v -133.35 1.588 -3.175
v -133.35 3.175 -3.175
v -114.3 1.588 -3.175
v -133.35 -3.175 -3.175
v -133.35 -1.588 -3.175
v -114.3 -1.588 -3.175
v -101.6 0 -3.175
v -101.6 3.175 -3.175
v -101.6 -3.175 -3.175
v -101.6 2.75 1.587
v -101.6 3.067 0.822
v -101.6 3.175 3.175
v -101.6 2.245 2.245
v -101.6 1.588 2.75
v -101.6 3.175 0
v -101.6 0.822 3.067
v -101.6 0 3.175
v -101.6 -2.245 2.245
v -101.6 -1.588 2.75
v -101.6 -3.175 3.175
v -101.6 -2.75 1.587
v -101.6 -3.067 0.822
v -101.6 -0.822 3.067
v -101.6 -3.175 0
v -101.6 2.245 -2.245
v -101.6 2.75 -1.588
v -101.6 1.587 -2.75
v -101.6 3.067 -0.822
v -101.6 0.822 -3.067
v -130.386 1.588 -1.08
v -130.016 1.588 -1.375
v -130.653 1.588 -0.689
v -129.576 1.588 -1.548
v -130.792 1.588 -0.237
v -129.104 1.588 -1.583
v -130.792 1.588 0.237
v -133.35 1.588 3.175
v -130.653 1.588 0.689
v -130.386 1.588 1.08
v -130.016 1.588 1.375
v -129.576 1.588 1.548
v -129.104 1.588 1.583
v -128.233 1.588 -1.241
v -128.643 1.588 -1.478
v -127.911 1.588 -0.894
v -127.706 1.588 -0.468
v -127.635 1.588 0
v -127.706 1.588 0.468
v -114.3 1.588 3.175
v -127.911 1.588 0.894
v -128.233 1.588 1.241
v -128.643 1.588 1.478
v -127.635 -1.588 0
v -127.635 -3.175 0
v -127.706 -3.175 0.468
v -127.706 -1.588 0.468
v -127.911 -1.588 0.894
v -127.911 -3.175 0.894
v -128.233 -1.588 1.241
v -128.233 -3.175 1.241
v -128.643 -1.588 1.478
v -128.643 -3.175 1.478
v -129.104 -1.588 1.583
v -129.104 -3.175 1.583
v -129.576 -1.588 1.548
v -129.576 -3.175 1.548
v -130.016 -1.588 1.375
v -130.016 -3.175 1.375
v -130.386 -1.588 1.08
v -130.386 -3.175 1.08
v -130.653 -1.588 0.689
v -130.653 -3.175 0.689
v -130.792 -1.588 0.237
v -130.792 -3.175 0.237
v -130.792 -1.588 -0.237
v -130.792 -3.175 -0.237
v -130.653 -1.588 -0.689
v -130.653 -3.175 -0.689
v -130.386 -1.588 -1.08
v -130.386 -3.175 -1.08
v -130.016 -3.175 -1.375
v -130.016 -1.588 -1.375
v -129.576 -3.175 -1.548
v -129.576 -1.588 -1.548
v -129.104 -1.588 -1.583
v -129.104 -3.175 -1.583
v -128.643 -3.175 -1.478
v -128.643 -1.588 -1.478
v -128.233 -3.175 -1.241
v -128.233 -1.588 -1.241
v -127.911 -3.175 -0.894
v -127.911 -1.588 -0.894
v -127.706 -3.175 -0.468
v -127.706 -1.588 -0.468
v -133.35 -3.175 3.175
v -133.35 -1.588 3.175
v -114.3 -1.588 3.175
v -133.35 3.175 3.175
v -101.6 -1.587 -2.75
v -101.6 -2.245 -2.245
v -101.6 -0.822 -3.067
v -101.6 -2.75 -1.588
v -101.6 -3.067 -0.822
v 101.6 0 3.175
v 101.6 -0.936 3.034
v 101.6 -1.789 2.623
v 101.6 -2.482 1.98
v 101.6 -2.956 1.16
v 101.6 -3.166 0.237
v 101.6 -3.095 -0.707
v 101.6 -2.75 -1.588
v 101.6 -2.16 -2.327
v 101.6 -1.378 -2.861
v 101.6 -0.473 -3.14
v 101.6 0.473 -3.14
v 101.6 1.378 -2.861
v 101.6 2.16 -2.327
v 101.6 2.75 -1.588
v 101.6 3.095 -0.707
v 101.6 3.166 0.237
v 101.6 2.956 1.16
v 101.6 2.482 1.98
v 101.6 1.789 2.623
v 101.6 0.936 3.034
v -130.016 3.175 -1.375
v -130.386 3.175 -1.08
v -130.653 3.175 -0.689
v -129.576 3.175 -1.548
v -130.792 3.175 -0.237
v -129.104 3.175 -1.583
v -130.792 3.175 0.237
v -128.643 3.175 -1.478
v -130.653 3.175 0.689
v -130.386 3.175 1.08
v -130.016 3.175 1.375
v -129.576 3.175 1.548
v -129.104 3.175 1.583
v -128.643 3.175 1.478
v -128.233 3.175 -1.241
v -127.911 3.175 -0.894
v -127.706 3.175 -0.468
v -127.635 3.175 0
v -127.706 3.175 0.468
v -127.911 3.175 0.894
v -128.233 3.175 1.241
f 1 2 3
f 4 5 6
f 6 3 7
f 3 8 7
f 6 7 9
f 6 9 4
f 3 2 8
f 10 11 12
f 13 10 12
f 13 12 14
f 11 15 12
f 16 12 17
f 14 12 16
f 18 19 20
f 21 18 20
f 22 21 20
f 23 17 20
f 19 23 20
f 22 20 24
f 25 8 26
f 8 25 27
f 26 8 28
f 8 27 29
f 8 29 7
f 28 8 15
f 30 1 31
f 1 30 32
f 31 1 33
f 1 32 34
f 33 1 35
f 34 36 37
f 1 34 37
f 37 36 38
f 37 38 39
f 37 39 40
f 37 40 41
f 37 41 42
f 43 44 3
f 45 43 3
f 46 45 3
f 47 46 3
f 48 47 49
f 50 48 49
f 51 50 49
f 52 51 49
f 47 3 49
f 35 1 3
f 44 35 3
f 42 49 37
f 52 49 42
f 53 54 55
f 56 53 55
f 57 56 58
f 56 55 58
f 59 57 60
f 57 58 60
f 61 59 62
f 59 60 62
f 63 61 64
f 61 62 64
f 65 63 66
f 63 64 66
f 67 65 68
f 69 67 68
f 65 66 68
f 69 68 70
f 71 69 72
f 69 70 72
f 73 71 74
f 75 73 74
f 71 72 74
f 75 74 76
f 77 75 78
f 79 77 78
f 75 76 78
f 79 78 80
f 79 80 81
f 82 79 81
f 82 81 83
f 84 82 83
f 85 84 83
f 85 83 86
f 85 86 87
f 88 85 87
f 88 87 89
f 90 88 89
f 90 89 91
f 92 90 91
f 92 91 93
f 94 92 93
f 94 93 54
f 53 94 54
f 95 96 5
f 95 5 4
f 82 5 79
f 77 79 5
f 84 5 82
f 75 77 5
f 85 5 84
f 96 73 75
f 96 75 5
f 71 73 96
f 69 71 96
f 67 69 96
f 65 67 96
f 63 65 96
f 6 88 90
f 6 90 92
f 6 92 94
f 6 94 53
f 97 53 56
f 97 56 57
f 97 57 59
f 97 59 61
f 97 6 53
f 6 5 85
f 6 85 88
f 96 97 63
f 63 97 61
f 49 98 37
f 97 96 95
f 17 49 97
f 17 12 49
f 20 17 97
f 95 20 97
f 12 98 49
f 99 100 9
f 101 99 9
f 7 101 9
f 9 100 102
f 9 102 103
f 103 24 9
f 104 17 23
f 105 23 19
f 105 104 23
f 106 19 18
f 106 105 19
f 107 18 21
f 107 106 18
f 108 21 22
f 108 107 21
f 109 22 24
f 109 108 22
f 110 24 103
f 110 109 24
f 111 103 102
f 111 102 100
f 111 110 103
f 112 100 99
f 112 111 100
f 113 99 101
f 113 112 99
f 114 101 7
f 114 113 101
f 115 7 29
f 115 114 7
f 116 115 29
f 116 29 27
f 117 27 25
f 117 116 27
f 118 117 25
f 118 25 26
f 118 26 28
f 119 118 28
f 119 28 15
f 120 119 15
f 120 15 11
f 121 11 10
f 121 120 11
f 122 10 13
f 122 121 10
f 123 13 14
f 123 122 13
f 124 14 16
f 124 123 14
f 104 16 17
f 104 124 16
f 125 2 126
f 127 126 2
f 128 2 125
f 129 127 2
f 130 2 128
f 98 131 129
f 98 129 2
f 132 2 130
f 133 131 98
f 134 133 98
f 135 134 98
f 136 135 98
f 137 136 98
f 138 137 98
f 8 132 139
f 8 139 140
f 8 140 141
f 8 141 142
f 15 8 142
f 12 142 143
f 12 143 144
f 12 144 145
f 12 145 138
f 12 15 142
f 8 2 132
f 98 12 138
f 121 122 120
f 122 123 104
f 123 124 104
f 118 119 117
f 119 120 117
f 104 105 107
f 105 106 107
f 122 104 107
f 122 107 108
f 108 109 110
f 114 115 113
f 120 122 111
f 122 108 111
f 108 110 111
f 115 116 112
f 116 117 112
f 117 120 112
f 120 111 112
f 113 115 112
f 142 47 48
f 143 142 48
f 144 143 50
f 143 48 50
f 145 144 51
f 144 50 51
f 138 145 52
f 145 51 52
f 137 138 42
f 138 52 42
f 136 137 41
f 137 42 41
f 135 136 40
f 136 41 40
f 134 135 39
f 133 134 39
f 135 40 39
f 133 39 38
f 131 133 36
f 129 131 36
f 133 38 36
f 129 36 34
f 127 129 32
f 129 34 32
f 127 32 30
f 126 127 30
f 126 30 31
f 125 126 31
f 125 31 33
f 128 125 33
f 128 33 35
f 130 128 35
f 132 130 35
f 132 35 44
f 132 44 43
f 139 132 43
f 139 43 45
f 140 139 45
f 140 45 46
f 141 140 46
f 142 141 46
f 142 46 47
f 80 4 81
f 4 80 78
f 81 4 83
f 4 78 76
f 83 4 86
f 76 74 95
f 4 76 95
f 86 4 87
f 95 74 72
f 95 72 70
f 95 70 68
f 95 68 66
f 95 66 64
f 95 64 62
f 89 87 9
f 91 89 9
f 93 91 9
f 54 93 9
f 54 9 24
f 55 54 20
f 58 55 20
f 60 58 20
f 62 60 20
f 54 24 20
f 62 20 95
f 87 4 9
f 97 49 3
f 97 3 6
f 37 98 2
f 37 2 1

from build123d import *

# Parameters (mm, degrees)
F0_W     = 203.2
F0_H     = 3.175
F2_W     = 6.35
F2_H     = 6.35
F3_DEPTH = 12.7
F4_W     = 1.5875
F4_H     = 6.35
F5_DEPTH = 19.05
F6_R     = 1.5875
F7_DEPTH = 25.4


with BuildPart() as f1:
    # F0 (on Front) → F1 (revolve)
    with BuildSketch(Plane.XZ):
        with Locations((0, 1.5875)):
            Rectangle(F0_W, F0_H)
    revolve(axis=Axis((0, 0, 0), (1, 0, 0)))

    # F2 (on face) → F3 (join)
    with BuildSketch(Plane(origin=(-101.6, 0, 0), x_dir=(0, -1, 0), z_dir=(-1, 0, 0))):
        Rectangle(F2_W, F2_H)
    extrude(amount=F3_DEPTH)

    # F4 (on face) → F5 (join)
    with BuildSketch(Plane(origin=(-114.3, 0, 0), x_dir=(0, -1, 0), z_dir=(-1, 0, 0))):
        with Locations((2.38125, 0)):
            Rectangle(F4_W, F4_H)
        with Locations((-2.38125, 0)):
            Rectangle(F4_W, F4_H)
    extrude(amount=F5_DEPTH)

    # F6 (on face) → F7 (cut)
    with BuildSketch(Plane.XZ.offset(3.175)):
        with Locations((-129.2225, 0)):
            Circle(F6_R)
    extrude(amount=-F7_DEPTH, mode=Mode.SUBTRACT)


solid = f1.part
